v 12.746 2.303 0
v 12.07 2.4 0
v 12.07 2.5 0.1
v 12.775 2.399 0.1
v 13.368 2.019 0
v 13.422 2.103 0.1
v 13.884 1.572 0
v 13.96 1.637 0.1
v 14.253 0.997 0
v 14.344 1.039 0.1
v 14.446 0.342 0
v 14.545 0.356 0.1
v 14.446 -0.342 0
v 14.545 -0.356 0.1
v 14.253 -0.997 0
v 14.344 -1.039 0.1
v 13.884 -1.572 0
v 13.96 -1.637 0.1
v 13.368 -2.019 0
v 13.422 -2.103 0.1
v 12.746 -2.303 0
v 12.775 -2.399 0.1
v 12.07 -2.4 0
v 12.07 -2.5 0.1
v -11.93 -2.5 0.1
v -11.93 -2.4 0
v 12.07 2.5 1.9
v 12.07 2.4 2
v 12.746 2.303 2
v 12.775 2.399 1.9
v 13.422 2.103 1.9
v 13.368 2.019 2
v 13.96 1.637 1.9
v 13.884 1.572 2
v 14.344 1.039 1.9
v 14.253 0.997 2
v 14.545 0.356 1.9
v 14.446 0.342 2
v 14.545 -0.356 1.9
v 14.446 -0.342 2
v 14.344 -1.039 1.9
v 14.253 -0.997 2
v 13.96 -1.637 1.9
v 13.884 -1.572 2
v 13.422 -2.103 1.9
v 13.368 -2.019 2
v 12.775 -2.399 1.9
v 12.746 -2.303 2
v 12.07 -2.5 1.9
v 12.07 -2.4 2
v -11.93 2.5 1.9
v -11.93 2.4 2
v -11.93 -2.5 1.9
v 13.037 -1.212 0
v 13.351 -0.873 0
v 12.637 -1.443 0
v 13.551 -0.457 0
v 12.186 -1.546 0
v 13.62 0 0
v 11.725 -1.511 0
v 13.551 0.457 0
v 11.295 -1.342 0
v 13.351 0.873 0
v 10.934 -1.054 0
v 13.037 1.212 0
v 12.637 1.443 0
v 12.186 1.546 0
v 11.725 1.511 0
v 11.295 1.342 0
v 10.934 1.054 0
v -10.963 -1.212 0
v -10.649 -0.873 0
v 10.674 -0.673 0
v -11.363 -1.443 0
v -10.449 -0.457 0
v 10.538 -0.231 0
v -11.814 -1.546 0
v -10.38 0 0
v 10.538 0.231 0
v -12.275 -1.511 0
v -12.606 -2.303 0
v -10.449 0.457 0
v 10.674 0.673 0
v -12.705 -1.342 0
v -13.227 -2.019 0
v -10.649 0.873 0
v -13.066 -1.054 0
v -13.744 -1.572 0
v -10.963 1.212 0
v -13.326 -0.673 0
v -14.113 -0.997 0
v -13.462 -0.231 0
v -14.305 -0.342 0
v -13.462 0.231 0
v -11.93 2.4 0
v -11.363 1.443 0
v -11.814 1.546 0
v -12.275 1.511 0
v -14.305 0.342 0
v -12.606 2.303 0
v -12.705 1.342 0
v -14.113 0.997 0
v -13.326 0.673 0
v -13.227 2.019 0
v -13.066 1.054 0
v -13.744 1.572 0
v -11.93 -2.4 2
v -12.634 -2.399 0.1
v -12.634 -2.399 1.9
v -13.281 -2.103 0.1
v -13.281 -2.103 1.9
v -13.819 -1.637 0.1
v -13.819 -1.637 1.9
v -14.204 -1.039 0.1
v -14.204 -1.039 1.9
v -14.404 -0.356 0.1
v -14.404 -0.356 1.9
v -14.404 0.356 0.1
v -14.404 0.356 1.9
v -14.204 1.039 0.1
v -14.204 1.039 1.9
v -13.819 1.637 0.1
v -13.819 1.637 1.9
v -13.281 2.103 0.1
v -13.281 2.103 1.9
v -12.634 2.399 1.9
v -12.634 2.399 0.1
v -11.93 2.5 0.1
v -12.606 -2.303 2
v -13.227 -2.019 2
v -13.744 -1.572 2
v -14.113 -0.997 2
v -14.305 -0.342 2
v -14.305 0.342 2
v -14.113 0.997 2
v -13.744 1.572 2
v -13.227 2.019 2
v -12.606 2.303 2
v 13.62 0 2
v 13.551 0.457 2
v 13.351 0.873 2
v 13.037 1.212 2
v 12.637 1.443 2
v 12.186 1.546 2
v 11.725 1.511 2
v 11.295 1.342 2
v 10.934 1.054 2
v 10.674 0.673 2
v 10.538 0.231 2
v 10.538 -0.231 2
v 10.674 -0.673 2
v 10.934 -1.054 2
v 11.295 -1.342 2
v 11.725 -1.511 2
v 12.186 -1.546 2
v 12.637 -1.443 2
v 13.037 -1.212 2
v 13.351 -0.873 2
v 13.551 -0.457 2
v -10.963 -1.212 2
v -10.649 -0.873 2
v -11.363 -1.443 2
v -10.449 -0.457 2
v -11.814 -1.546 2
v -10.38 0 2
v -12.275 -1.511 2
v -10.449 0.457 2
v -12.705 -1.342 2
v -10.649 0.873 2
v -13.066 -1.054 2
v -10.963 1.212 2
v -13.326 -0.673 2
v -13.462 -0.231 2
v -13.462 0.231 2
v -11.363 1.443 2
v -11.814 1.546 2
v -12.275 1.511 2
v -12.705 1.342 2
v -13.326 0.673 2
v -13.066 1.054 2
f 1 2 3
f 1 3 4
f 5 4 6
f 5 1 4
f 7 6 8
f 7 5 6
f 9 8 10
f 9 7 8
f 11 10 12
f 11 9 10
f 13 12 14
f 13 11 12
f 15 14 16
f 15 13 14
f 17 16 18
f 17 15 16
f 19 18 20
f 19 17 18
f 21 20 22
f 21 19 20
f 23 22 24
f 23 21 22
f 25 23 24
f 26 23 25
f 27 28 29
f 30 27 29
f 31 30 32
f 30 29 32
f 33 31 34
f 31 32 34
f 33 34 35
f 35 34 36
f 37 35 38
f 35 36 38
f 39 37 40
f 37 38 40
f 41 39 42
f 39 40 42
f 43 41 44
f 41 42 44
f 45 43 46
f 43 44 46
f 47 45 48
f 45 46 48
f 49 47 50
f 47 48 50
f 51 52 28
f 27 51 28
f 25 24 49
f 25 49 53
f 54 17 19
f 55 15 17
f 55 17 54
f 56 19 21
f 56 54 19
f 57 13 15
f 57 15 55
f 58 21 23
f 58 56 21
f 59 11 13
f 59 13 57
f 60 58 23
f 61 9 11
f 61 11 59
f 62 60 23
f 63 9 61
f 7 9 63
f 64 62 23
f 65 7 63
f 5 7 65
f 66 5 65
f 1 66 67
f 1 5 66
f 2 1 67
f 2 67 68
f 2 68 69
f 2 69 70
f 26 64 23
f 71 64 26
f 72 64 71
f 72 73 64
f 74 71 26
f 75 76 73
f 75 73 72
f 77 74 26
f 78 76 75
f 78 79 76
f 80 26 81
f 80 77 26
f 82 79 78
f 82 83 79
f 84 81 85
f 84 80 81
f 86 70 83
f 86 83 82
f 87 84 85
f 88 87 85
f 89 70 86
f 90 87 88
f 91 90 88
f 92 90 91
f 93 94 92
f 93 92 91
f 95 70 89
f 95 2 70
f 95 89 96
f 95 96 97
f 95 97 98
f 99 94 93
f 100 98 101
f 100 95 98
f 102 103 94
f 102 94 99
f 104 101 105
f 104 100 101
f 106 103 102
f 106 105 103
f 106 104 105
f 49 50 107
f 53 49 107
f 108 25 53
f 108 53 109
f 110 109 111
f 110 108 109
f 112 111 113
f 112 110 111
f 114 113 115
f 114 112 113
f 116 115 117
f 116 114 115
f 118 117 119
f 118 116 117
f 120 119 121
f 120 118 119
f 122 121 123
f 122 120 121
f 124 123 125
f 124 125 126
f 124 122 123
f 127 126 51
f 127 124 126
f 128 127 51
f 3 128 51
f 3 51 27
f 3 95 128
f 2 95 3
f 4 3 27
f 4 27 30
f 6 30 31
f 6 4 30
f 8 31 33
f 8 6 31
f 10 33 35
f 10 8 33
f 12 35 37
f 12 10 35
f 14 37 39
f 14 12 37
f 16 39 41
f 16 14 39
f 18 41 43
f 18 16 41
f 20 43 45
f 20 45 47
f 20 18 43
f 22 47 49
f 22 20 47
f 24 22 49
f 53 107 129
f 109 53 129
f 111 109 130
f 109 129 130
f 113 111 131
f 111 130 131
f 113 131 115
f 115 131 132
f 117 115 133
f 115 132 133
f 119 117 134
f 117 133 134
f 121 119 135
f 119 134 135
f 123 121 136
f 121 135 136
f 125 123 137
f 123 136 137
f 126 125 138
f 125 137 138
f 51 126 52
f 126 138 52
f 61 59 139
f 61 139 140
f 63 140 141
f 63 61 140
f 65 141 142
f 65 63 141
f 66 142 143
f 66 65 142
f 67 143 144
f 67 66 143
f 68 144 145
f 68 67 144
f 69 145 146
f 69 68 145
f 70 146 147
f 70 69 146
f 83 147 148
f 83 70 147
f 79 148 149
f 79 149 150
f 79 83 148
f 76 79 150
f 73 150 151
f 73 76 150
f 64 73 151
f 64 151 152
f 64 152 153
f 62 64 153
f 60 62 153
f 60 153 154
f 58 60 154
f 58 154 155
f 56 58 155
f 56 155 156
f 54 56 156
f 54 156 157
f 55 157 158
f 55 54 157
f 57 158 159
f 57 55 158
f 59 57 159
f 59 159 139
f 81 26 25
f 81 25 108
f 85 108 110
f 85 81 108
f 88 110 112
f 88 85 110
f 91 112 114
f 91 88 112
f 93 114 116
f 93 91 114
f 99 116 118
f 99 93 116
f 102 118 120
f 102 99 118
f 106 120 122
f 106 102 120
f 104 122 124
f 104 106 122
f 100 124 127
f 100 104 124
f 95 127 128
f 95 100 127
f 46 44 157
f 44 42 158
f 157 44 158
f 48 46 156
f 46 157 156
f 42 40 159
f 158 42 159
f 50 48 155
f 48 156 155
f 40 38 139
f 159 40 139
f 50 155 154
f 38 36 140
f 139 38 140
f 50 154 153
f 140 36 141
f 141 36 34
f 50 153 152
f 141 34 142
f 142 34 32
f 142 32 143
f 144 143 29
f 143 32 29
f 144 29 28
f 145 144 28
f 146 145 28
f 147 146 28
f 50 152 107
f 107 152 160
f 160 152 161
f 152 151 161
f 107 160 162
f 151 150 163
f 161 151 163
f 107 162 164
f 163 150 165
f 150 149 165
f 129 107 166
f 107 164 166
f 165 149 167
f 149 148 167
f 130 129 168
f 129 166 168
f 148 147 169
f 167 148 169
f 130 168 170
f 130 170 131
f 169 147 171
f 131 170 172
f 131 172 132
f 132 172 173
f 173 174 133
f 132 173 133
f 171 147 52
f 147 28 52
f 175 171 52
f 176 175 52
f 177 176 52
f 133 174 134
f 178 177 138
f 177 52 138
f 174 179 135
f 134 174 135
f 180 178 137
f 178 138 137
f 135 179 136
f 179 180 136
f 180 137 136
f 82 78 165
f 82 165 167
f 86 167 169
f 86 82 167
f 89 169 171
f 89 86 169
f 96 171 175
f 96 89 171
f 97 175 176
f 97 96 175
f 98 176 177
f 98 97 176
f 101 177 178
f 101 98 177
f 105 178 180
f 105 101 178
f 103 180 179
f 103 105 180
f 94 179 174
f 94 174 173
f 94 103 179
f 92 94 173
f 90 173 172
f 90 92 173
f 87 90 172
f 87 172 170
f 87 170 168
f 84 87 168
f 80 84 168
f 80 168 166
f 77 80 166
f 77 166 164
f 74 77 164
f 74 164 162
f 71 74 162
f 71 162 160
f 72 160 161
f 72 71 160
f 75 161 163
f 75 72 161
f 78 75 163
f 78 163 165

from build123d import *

# Parameters (mm, degrees)
SKETCH1_R           = 1.55
BOSS_EXTRUDE1_DEPTH = 2
CHAMFER1_SIZE       = 0.1


with BuildPart() as part:
    # Sketch1 → Boss-Extrude1 (new body)
    with BuildSketch(Plane.XY):
        with BuildLine():
            Line((-11.929744939, 2.5), (12.070255061, 2.5))
            ThreePointArc((12.070255061, 2.5), (14.570255061, 0), (12.070255061, -2.5))
            Line((12.070255061, -2.5), (-11.929744939, -2.5))
            ThreePointArc((-11.929744939, -2.5), (-14.429744939, 0), (-11.929744939, 2.5))
        make_face()
        with Locations((12.070255061, 0)):
            Circle(SKETCH1_R, mode=Mode.SUBTRACT)
        with Locations((-11.929744939, 0)):
            Circle(SKETCH1_R, mode=Mode.SUBTRACT)
    extrude(amount=BOSS_EXTRUDE1_DEPTH)

    # Chamfer1
    chamfer1_edges = [part.edges().sort_by_distance(p)[0] for p in [
        (14.570255061, 0, 2),
        (0.070255061, 2.5, 2),
        (-14.429744939, 0, 2),
        (0.070255061, 2.5, 0),
        (14.570255061, 0, 0),
        (0.070255061, -2.5, 0),
        (-14.429744939, 0, 0),
        (0.070255061, -2.5, 2),
    ]]
    chamfer(chamfer1_edges, length=CHAMFER1_SIZE)


solid = part.part
